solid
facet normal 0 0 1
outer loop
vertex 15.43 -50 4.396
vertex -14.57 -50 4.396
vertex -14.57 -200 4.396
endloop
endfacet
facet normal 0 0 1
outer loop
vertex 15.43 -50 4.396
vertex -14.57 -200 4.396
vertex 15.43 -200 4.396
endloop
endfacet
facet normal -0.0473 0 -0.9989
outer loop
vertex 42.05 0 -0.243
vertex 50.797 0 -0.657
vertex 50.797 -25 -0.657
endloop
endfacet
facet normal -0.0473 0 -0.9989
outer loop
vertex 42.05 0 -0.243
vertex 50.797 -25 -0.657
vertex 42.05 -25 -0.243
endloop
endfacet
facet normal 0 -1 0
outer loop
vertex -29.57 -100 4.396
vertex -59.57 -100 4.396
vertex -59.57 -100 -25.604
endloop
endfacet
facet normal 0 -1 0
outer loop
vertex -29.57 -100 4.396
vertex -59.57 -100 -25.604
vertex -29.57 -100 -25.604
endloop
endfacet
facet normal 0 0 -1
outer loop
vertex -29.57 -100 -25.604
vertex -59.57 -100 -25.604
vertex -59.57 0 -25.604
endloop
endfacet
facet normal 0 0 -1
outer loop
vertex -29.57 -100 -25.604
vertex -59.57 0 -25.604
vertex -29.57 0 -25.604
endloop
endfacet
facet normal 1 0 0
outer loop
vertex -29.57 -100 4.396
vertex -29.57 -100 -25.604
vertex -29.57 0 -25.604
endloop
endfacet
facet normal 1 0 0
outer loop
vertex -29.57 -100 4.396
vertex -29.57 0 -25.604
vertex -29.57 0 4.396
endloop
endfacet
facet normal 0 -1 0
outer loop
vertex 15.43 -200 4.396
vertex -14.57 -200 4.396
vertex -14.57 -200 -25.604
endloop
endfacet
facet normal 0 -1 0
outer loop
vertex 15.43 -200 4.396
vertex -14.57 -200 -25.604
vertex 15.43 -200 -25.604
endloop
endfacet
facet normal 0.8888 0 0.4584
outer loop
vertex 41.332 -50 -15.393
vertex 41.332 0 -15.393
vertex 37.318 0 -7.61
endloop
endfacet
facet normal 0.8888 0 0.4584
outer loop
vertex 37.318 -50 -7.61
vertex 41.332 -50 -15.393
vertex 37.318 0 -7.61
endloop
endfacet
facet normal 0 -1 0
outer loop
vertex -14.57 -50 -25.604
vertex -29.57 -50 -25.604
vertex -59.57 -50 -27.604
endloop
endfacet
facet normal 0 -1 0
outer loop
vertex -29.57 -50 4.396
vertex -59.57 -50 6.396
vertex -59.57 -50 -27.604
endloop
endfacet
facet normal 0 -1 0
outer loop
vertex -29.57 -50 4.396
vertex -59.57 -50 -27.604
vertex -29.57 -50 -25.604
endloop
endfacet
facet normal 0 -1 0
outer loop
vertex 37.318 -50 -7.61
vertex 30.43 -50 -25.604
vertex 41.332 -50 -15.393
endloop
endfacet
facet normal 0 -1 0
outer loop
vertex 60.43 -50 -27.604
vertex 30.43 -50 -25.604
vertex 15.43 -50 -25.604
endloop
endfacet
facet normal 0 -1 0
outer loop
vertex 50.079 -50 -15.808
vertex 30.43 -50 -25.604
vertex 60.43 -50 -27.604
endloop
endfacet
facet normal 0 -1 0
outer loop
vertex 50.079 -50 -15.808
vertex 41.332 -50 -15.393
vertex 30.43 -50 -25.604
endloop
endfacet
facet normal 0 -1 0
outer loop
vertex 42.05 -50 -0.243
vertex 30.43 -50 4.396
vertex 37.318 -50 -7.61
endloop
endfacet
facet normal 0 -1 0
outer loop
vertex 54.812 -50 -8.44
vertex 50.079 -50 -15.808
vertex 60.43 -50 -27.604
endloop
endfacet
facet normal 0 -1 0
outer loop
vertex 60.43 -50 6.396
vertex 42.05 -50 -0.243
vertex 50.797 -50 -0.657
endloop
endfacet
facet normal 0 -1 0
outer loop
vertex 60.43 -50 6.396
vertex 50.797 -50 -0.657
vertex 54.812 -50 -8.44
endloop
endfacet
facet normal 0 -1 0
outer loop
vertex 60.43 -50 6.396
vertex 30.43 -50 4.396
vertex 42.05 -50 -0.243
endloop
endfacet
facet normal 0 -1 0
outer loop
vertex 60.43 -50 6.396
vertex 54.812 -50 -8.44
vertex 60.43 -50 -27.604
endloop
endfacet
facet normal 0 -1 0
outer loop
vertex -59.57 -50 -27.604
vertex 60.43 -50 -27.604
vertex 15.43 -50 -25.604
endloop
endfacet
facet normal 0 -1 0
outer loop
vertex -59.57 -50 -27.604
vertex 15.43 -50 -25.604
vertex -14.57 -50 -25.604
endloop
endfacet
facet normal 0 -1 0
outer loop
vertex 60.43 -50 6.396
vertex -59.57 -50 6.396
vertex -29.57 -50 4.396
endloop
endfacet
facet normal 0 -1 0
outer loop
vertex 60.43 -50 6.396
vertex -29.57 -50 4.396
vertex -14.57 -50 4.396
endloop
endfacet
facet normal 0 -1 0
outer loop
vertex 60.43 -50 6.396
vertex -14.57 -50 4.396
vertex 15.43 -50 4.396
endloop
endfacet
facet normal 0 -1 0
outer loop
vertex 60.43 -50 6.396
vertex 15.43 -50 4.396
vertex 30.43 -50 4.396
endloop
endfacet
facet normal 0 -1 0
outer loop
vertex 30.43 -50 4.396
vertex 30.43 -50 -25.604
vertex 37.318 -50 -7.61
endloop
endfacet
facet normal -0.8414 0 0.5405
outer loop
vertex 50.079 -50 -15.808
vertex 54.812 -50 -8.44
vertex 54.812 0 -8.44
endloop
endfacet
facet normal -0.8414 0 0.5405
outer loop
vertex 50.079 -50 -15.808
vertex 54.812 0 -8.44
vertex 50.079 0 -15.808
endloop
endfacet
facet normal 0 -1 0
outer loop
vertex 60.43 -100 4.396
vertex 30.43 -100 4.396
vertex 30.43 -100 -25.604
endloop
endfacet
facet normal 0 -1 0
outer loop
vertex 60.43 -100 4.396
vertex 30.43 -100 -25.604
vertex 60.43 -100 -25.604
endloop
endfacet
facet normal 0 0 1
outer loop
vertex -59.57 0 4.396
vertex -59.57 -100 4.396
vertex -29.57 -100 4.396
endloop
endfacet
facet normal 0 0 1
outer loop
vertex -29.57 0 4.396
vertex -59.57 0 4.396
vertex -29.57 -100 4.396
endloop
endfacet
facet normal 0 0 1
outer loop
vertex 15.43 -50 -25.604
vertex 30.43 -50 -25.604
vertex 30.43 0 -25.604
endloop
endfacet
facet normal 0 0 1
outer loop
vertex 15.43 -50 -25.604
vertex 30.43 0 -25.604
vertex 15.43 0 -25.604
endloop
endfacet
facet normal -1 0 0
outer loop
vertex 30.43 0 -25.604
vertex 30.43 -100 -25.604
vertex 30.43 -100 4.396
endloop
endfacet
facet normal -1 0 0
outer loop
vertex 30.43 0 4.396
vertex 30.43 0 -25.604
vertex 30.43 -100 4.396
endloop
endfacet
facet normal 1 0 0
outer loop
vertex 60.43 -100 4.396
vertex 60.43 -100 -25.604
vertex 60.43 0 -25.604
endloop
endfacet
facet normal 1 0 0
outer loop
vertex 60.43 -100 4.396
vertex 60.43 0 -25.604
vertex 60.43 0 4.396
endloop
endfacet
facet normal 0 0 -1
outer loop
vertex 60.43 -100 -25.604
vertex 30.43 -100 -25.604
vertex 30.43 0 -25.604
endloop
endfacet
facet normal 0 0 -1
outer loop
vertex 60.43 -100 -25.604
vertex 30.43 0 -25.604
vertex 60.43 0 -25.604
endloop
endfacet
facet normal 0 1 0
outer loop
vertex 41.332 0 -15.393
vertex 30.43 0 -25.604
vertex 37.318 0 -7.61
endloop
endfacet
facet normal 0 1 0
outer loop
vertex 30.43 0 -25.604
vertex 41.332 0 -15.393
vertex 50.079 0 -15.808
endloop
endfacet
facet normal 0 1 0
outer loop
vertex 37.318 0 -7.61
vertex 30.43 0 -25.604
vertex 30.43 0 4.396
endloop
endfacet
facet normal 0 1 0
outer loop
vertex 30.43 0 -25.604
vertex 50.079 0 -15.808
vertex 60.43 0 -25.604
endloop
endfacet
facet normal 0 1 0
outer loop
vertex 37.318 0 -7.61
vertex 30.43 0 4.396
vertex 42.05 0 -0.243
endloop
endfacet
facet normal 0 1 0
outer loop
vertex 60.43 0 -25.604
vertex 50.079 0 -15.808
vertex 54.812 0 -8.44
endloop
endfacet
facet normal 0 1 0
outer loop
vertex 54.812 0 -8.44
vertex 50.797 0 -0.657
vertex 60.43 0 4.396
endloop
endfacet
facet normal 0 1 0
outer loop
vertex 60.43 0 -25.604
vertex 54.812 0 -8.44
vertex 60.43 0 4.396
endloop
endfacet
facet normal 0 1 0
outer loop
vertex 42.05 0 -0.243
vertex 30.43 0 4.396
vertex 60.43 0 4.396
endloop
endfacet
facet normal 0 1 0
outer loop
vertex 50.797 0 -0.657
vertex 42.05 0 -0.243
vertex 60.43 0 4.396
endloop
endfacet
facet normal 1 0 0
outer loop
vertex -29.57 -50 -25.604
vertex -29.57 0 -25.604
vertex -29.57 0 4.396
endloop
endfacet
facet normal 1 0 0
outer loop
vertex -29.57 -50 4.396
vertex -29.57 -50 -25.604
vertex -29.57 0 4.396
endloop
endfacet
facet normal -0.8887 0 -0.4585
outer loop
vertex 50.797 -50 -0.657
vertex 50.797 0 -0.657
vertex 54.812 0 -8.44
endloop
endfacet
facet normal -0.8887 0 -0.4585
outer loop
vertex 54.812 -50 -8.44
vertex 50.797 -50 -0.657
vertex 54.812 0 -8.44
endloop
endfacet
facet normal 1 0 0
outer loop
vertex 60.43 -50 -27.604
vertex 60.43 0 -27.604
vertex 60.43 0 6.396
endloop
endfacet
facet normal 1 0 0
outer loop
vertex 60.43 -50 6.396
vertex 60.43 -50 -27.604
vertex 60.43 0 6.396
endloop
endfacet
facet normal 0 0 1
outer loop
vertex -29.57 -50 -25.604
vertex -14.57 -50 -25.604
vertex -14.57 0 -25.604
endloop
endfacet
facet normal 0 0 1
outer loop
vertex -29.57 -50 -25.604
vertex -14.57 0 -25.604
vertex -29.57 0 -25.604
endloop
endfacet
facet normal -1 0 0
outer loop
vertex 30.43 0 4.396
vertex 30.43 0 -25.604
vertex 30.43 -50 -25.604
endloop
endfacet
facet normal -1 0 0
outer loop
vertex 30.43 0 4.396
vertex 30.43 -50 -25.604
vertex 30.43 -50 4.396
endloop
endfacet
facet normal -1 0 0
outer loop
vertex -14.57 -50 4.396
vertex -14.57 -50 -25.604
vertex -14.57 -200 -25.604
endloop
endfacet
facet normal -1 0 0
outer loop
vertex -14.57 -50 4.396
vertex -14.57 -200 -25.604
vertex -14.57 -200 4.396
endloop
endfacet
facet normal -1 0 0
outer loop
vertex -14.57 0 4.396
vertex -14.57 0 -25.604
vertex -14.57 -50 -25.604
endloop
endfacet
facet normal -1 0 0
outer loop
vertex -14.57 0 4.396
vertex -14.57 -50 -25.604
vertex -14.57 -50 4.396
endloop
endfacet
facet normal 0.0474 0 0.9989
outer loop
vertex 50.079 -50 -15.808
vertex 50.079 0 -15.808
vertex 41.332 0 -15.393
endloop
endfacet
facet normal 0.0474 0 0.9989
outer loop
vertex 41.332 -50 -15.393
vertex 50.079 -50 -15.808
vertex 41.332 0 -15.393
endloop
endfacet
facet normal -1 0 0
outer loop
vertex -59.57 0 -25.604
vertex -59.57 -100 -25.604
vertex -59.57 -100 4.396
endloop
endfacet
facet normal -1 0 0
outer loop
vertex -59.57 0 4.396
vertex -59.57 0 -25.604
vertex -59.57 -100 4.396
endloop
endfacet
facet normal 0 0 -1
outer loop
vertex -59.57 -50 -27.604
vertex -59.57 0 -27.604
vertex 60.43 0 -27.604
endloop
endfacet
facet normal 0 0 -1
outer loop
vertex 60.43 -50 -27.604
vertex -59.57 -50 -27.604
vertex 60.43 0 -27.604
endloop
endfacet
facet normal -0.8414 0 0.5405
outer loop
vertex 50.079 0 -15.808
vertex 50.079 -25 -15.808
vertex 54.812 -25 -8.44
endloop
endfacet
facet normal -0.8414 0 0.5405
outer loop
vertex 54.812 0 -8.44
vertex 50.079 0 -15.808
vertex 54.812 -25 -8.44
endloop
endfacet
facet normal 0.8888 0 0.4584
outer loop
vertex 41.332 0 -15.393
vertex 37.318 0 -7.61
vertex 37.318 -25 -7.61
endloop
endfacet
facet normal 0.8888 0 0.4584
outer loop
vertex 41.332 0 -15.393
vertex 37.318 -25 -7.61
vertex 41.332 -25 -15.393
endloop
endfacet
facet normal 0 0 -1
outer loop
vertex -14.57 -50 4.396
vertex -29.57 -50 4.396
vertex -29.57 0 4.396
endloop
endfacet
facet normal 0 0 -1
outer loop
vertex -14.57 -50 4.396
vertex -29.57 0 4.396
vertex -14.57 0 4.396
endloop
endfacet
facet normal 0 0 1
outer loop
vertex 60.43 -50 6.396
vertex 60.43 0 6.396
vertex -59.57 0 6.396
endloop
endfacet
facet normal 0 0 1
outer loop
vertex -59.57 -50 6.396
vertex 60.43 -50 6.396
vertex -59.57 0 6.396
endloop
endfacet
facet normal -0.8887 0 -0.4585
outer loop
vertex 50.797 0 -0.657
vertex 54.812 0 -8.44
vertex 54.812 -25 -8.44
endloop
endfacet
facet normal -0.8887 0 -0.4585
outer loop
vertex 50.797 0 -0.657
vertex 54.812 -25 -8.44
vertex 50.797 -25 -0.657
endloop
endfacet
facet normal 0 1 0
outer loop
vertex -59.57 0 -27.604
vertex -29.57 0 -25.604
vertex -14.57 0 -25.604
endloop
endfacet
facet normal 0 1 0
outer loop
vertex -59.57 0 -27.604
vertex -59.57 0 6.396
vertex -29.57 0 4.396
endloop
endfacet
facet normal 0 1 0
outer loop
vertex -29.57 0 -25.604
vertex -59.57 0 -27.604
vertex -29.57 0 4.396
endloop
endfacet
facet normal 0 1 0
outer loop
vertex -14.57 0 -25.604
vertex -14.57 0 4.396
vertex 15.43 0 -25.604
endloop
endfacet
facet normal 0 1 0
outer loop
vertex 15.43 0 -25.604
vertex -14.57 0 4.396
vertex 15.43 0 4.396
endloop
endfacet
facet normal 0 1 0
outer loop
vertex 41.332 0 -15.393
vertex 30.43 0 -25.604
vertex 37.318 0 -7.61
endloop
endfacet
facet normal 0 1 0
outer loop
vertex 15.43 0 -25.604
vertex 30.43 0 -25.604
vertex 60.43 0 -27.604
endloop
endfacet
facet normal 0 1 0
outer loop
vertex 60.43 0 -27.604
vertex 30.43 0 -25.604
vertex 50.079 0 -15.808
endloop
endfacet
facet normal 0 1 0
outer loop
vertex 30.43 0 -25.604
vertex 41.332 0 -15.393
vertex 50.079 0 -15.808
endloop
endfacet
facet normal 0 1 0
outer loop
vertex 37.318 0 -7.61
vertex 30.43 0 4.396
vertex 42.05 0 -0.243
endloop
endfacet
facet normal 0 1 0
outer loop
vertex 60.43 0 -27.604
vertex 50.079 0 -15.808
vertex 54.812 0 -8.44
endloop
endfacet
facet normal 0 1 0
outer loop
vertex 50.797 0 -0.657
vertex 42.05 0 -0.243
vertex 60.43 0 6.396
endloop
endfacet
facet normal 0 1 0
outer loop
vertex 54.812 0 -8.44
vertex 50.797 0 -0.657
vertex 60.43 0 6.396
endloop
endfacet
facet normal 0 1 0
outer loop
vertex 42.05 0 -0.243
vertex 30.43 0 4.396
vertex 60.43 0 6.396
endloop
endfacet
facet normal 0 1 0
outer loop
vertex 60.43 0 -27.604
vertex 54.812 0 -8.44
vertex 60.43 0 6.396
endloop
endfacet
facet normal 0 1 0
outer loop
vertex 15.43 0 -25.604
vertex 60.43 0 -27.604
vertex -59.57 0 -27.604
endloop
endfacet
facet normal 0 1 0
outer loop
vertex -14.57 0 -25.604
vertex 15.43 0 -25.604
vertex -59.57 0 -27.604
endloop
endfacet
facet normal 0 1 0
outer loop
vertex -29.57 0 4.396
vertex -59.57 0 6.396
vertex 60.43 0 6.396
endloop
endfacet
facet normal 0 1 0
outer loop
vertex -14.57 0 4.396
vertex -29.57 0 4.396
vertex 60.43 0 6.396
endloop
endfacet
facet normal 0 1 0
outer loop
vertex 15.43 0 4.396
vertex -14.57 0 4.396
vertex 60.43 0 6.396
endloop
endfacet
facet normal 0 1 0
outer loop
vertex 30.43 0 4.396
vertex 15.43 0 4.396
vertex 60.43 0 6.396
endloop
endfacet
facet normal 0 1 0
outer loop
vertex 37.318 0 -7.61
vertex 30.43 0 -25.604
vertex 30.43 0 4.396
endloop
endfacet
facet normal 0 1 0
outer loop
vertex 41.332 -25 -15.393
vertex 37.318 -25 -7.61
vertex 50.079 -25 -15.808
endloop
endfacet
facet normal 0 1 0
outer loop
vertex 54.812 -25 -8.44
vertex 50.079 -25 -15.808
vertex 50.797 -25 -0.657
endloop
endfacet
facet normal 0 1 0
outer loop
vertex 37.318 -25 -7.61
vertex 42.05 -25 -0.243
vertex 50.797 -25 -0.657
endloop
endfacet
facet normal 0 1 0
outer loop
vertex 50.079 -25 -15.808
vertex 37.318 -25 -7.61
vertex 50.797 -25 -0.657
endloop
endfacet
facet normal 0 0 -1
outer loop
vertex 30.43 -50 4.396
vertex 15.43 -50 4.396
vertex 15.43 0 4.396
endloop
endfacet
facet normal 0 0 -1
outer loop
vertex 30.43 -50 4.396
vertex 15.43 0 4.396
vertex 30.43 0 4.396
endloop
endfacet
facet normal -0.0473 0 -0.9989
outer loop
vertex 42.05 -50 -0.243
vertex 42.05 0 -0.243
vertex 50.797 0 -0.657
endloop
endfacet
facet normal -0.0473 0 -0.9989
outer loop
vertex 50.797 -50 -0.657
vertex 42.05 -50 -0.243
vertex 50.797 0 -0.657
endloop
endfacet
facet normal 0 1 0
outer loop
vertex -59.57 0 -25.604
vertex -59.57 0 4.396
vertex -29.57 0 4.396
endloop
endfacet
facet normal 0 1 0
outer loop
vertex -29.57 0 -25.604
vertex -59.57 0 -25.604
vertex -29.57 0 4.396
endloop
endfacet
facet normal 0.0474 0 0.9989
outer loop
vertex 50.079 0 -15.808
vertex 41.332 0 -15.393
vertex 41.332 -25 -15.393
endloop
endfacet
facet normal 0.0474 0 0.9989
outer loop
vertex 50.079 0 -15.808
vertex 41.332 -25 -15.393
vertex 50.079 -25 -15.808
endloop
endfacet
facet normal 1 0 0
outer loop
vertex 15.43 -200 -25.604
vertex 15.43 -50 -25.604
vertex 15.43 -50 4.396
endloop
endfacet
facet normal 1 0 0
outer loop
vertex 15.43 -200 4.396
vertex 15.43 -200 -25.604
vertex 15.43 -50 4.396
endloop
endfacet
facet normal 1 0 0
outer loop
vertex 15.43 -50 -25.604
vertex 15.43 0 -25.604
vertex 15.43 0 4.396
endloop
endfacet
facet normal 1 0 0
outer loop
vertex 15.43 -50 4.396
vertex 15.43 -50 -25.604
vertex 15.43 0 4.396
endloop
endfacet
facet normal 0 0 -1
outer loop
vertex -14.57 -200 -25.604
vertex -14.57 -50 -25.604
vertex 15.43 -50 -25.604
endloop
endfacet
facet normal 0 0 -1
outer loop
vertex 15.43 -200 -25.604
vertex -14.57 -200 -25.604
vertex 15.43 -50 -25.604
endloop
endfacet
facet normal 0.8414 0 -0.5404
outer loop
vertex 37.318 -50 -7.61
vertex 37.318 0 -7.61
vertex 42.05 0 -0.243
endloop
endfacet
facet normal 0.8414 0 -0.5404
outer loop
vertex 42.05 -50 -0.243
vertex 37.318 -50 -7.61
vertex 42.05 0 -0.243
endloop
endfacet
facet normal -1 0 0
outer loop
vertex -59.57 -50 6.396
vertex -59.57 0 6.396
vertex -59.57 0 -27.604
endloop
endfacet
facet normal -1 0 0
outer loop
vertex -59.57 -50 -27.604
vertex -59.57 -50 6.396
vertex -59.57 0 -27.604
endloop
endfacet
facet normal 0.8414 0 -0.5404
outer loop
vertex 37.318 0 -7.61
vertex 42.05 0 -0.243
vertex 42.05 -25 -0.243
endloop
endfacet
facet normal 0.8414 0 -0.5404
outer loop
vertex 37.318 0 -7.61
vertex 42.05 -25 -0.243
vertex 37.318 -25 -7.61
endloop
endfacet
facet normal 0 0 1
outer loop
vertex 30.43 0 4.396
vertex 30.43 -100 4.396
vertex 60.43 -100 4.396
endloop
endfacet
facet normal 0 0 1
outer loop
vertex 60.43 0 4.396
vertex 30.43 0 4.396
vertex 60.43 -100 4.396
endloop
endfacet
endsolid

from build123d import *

# Parameters (mm, degrees)
F0_W     = 30
F0_H     = 30
F1_DEPTH = 50
F2_DEPTH = 200
F3_DEPTH = 100
F4_DEPTH = 25


with BuildPart() as f1:
    # F0 (on Front) → F1 (new body)
    with BuildSketch(Plane.XZ):
        Polygon((-59.57008, 6.396498), (-59.57008, 4.396498), (-29.57008, 4.396498), (-14.57008, 4.396498), (15.42992, 4.396498), (30.42992, 4.396498), (60.42992, 4.396498), (60.42992, 6.396498), align=None)
        with Locations((-44.57008, -10.603502)):
            Rectangle(F0_W, F0_H)
        Polygon((-29.57008, -25.603502), (-59.57008, -25.603502), (-59.57008, -27.603502), (60.42992, -27.603502), (60.42992, -25.603502), (30.42992, -25.603502), (15.42992, -25.603502), (-14.57008, -25.603502), align=None)
        with Locations((45.42992, -10.603502)):
            Rectangle(F0_W, F0_H)
        Polygon((50.078775, -15.807562), (41.331842, -15.392709), (37.317649, -7.610217), (42.050388, -0.242577), (50.797321, -0.65743), (54.811515, -8.439923), align=None, mode=Mode.SUBTRACT)
    extrude(amount=F1_DEPTH)

    # F0 (on Front) → F2 (join)
    with BuildSketch(Plane.XZ):
        with Locations((0.42992, -10.603502)):
            Rectangle(F0_W, F0_H)
    extrude(amount=F2_DEPTH)


with BuildPart() as f3:
    # F0 (on Front) → F3 (new body)
    with BuildSketch(Plane.XZ):
        with Locations((45.42992, -10.603502)):
            Rectangle(F0_W, F0_H)
        Polygon((50.078775, -15.807562), (41.331842, -15.392709), (37.317649, -7.610217), (42.050388, -0.242577), (50.797321, -0.65743), (54.811515, -8.439923), align=None, mode=Mode.SUBTRACT)
        Polygon((37.317649, -7.610217), (41.331842, -15.392709), (50.078775, -15.807562), (54.811515, -8.439923), (50.797321, -0.65743), (42.050388, -0.242577), align=None)
        with Locations((-44.57008, -10.603502)):
            Rectangle(F0_W, F0_H)
    extrude(amount=F3_DEPTH)

    # F0 (on Front) → F4 (cut)
    with BuildSketch(Plane.XZ):
        Polygon((37.317649, -7.610217), (41.331842, -15.392709), (50.078775, -15.807562), (54.811515, -8.439923), (50.797321, -0.65743), (42.050388, -0.242577), align=None)
    extrude(amount=F4_DEPTH, mode=Mode.SUBTRACT)


solid = Compound([f1.part, f3.part])
